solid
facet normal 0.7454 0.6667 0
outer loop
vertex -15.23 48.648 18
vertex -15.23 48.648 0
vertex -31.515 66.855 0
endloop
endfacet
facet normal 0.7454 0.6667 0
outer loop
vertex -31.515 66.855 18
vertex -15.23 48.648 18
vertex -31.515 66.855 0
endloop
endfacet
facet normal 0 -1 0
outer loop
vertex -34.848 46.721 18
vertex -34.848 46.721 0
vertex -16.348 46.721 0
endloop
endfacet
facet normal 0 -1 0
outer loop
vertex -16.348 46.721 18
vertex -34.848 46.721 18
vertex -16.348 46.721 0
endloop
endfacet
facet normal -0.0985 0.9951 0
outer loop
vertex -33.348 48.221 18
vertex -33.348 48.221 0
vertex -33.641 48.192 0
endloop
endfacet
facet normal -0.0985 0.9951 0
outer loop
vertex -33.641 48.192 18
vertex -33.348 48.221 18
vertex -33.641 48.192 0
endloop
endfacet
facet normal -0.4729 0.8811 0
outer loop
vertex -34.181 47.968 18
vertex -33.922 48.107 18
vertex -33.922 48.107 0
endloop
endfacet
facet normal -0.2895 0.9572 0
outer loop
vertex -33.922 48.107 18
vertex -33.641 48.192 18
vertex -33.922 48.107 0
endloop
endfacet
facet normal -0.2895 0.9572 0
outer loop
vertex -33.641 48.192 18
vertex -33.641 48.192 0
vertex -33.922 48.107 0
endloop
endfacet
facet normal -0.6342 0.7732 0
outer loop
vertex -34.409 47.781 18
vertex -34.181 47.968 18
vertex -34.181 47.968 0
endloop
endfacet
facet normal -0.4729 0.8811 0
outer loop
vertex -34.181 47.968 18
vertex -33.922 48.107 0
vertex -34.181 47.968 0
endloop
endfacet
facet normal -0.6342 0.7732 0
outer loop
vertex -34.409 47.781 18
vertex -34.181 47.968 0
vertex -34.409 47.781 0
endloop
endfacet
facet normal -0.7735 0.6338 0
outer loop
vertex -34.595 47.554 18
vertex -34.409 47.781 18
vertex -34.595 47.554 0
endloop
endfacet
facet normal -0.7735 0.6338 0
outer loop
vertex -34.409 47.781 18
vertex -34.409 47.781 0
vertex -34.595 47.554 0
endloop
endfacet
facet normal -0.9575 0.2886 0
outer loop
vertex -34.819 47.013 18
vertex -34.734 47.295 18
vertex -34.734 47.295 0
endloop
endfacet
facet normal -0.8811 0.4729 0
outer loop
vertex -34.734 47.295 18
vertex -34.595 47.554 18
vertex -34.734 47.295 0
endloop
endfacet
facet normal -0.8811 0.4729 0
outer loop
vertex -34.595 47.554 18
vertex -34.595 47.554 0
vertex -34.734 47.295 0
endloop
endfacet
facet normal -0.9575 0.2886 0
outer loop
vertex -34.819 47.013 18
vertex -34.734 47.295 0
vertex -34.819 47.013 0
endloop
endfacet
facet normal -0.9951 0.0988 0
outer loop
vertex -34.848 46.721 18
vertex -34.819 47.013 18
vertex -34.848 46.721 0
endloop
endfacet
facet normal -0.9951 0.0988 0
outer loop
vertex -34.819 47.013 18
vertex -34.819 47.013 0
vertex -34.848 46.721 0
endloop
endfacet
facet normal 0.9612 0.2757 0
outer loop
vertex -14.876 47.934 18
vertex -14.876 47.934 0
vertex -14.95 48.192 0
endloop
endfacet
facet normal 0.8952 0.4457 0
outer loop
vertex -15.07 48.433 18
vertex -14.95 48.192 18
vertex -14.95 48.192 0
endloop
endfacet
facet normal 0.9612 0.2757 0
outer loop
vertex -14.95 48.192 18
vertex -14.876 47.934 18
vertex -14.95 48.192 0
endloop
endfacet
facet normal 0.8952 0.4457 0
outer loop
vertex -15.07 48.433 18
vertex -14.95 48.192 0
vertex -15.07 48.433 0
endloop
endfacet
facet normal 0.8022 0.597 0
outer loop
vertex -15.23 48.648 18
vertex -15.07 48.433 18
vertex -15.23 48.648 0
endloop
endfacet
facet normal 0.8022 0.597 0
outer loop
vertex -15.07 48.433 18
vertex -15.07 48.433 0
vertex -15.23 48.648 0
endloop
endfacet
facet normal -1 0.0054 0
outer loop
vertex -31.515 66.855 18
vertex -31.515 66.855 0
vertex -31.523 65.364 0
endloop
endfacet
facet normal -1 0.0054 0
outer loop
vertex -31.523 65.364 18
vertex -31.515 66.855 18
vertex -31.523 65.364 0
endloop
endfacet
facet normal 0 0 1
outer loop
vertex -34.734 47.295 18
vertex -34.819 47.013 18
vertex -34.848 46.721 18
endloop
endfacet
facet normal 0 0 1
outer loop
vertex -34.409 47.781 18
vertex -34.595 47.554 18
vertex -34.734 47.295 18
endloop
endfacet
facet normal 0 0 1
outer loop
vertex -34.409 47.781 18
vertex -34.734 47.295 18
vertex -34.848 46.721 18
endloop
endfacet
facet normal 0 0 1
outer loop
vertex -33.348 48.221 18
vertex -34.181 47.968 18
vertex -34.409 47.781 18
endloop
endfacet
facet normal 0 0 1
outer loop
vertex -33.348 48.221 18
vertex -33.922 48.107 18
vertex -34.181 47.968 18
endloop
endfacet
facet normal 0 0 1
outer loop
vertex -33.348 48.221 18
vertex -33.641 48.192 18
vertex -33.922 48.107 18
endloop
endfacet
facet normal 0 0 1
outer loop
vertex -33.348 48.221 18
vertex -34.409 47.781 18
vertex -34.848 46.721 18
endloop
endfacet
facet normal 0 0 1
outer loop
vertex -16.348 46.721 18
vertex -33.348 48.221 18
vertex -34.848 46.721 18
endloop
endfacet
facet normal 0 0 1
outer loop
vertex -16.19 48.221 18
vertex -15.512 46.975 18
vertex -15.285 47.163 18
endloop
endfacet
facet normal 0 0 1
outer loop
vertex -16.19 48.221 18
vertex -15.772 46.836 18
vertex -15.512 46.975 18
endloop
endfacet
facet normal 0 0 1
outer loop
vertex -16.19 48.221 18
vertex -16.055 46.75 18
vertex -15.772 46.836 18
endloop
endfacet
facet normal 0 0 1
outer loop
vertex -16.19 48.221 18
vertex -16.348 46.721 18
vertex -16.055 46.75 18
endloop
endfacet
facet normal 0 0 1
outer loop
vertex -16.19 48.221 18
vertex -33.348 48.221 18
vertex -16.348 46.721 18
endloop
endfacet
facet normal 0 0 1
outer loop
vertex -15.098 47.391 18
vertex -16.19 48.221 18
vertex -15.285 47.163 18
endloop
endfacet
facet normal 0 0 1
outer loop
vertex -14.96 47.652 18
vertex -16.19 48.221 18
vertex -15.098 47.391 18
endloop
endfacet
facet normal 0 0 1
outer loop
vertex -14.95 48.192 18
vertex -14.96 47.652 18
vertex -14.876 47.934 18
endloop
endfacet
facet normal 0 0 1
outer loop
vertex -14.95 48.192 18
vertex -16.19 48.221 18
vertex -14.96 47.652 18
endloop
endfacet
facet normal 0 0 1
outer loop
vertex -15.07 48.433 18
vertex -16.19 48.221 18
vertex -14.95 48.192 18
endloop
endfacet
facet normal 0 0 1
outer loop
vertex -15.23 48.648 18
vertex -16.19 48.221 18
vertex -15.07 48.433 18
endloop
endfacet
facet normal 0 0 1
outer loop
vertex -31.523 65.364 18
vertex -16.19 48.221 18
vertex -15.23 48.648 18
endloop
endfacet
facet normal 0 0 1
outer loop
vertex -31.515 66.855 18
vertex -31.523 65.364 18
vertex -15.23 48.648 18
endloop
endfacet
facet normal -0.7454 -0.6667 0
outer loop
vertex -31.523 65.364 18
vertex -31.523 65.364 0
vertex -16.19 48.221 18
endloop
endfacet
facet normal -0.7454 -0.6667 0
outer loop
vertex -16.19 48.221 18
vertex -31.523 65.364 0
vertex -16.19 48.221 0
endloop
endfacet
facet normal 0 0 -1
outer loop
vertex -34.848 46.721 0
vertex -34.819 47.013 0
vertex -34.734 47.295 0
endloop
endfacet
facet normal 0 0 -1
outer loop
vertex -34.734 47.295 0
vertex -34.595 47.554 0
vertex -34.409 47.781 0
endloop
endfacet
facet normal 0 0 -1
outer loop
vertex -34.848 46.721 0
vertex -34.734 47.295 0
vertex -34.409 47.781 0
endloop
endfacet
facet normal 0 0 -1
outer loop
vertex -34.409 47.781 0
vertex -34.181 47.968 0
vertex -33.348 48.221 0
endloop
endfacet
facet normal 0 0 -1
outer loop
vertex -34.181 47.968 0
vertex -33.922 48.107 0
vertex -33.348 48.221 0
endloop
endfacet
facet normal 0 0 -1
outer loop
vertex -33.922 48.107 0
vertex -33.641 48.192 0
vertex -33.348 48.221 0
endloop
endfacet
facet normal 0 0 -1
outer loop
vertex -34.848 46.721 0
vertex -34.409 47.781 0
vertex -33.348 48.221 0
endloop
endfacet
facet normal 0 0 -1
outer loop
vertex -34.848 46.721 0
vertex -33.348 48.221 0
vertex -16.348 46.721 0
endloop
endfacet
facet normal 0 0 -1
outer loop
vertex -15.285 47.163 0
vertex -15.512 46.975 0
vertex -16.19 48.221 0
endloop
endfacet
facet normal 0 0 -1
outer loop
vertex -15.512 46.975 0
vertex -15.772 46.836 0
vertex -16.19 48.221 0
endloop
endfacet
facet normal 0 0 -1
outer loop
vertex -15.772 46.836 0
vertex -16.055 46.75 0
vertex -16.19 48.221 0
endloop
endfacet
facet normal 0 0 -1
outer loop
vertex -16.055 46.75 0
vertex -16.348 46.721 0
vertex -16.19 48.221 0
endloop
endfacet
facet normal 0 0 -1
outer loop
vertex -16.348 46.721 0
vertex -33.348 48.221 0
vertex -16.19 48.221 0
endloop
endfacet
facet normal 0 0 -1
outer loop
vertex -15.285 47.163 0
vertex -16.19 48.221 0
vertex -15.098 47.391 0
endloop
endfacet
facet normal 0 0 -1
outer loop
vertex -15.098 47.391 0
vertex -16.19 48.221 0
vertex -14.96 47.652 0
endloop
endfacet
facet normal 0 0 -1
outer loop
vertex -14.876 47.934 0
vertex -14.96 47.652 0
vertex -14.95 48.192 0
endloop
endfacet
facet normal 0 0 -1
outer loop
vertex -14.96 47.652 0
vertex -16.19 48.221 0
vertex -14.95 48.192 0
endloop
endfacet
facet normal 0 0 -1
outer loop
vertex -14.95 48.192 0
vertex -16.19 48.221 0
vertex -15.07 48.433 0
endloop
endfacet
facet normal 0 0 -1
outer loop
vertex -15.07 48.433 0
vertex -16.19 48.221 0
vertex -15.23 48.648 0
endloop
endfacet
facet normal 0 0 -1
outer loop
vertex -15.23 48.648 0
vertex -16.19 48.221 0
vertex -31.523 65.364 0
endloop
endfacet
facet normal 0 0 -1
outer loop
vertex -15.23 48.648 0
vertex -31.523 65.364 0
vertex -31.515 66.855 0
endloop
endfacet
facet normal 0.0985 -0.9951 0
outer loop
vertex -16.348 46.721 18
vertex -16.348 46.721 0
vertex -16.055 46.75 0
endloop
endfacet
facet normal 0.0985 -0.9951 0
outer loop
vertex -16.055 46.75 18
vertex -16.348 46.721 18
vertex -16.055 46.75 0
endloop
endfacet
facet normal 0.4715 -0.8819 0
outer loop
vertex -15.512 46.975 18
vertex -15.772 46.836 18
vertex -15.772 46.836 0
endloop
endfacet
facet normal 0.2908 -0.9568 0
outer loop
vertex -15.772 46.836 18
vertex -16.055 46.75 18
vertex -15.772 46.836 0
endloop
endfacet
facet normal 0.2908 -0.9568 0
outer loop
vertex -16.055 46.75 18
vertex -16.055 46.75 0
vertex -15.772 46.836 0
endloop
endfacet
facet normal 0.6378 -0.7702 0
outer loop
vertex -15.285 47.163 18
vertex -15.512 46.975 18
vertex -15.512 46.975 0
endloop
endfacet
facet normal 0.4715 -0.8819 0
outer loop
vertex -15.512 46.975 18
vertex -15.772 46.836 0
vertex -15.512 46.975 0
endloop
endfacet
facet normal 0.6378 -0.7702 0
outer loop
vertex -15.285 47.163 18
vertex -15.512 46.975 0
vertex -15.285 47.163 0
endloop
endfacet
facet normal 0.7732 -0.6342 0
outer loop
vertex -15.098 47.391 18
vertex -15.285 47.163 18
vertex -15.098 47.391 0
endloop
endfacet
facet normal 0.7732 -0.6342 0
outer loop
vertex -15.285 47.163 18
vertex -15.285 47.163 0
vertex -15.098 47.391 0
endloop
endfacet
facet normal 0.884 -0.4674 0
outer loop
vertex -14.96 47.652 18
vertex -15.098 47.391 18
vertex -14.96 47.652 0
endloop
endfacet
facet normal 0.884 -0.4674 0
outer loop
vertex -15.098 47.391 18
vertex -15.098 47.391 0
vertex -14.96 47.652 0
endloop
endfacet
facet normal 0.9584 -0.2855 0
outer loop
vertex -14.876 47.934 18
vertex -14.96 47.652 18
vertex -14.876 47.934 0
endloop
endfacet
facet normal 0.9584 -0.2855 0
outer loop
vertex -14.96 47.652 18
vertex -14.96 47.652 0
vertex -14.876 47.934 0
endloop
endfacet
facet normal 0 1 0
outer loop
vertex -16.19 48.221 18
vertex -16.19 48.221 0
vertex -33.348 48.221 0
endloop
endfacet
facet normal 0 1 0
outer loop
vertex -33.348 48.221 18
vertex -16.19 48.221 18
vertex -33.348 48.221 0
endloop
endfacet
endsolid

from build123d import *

# Parameters (mm, degrees)
F1_DEPTH    = 18
F2_T1_DEPTH = 25.5
F2_T3_DEPTH = 20.8647450844


# Not quite as in the source:
# - a fillet or chamfer that OpenCascade refuses, or shapes differently, is made with other operations: its cross-section is extruded or revolved along the edge and cut away or added


with BuildPart() as f1:
    # F0 (on Top) → F1 (new body)
    with BuildSketch(Plane.XY):
        Polygon((-16.1896759786, 48.2207899958), (-34.8480351921, 48.2207899958), (-34.8480351921, 46.7207899958), (-14.8480351921, 46.7207899958), (-14.8480351921, 48.2207899958), (-31.5147018588, 66.8546898083), (-31.523009312, 65.3639778233), align=None)
    extrude(amount=F1_DEPTH)

    # F2: fillet of radius 1.5 on 3 edges, made by hand

    # F2_s2 → F2_t1 (cut)
    with BuildSketch(Plane.XY.offset(-3.75)):
        with BuildLine():
            ThreePointArc((-16.3480351921, 46.7207899958), (-15.2873750203, 47.160129824), (-14.8480351921, 48.2207899958))
            Line((-14.8480351921, 48.2207899958), (-14.8480351921, 46.7207899958))
            Line((-14.8480351921, 46.7207899958), (-16.3480351921, 46.7207899958))
        make_face()
        with BuildLine():
            ThreePointArc((-33.3480351921, 48.2207899958), (-34.4086953639, 47.7814501676), (-34.8480351921, 46.7207899958))
            Line((-34.8480351921, 46.7207899958), (-34.8480351921, 48.2207899958))
            Line((-34.8480351921, 48.2207899958), (-33.3480351921, 48.2207899958))
        make_face()
    extrude(amount=F2_T1_DEPTH, mode=Mode.SUBTRACT)

    # F2_s4 → F2_t3 (cut)
    with BuildSketch(Plane.XY.offset(-1.4323725422)):
        with BuildLine():
            ThreePointArc((-14.8480351921, 47.6478409789), (-14.9467766537, 48.1830741136), (-15.2300012034, 48.6478409789))
            Line((-15.2300012034, 48.6478409789), (-14.8480351921, 48.2207899958))
            Line((-14.8480351921, 48.2207899958), (-14.8480351921, 47.6478409789))
        make_face()
    extrude(amount=F2_T3_DEPTH, mode=Mode.SUBTRACT)


solid = f1.part
